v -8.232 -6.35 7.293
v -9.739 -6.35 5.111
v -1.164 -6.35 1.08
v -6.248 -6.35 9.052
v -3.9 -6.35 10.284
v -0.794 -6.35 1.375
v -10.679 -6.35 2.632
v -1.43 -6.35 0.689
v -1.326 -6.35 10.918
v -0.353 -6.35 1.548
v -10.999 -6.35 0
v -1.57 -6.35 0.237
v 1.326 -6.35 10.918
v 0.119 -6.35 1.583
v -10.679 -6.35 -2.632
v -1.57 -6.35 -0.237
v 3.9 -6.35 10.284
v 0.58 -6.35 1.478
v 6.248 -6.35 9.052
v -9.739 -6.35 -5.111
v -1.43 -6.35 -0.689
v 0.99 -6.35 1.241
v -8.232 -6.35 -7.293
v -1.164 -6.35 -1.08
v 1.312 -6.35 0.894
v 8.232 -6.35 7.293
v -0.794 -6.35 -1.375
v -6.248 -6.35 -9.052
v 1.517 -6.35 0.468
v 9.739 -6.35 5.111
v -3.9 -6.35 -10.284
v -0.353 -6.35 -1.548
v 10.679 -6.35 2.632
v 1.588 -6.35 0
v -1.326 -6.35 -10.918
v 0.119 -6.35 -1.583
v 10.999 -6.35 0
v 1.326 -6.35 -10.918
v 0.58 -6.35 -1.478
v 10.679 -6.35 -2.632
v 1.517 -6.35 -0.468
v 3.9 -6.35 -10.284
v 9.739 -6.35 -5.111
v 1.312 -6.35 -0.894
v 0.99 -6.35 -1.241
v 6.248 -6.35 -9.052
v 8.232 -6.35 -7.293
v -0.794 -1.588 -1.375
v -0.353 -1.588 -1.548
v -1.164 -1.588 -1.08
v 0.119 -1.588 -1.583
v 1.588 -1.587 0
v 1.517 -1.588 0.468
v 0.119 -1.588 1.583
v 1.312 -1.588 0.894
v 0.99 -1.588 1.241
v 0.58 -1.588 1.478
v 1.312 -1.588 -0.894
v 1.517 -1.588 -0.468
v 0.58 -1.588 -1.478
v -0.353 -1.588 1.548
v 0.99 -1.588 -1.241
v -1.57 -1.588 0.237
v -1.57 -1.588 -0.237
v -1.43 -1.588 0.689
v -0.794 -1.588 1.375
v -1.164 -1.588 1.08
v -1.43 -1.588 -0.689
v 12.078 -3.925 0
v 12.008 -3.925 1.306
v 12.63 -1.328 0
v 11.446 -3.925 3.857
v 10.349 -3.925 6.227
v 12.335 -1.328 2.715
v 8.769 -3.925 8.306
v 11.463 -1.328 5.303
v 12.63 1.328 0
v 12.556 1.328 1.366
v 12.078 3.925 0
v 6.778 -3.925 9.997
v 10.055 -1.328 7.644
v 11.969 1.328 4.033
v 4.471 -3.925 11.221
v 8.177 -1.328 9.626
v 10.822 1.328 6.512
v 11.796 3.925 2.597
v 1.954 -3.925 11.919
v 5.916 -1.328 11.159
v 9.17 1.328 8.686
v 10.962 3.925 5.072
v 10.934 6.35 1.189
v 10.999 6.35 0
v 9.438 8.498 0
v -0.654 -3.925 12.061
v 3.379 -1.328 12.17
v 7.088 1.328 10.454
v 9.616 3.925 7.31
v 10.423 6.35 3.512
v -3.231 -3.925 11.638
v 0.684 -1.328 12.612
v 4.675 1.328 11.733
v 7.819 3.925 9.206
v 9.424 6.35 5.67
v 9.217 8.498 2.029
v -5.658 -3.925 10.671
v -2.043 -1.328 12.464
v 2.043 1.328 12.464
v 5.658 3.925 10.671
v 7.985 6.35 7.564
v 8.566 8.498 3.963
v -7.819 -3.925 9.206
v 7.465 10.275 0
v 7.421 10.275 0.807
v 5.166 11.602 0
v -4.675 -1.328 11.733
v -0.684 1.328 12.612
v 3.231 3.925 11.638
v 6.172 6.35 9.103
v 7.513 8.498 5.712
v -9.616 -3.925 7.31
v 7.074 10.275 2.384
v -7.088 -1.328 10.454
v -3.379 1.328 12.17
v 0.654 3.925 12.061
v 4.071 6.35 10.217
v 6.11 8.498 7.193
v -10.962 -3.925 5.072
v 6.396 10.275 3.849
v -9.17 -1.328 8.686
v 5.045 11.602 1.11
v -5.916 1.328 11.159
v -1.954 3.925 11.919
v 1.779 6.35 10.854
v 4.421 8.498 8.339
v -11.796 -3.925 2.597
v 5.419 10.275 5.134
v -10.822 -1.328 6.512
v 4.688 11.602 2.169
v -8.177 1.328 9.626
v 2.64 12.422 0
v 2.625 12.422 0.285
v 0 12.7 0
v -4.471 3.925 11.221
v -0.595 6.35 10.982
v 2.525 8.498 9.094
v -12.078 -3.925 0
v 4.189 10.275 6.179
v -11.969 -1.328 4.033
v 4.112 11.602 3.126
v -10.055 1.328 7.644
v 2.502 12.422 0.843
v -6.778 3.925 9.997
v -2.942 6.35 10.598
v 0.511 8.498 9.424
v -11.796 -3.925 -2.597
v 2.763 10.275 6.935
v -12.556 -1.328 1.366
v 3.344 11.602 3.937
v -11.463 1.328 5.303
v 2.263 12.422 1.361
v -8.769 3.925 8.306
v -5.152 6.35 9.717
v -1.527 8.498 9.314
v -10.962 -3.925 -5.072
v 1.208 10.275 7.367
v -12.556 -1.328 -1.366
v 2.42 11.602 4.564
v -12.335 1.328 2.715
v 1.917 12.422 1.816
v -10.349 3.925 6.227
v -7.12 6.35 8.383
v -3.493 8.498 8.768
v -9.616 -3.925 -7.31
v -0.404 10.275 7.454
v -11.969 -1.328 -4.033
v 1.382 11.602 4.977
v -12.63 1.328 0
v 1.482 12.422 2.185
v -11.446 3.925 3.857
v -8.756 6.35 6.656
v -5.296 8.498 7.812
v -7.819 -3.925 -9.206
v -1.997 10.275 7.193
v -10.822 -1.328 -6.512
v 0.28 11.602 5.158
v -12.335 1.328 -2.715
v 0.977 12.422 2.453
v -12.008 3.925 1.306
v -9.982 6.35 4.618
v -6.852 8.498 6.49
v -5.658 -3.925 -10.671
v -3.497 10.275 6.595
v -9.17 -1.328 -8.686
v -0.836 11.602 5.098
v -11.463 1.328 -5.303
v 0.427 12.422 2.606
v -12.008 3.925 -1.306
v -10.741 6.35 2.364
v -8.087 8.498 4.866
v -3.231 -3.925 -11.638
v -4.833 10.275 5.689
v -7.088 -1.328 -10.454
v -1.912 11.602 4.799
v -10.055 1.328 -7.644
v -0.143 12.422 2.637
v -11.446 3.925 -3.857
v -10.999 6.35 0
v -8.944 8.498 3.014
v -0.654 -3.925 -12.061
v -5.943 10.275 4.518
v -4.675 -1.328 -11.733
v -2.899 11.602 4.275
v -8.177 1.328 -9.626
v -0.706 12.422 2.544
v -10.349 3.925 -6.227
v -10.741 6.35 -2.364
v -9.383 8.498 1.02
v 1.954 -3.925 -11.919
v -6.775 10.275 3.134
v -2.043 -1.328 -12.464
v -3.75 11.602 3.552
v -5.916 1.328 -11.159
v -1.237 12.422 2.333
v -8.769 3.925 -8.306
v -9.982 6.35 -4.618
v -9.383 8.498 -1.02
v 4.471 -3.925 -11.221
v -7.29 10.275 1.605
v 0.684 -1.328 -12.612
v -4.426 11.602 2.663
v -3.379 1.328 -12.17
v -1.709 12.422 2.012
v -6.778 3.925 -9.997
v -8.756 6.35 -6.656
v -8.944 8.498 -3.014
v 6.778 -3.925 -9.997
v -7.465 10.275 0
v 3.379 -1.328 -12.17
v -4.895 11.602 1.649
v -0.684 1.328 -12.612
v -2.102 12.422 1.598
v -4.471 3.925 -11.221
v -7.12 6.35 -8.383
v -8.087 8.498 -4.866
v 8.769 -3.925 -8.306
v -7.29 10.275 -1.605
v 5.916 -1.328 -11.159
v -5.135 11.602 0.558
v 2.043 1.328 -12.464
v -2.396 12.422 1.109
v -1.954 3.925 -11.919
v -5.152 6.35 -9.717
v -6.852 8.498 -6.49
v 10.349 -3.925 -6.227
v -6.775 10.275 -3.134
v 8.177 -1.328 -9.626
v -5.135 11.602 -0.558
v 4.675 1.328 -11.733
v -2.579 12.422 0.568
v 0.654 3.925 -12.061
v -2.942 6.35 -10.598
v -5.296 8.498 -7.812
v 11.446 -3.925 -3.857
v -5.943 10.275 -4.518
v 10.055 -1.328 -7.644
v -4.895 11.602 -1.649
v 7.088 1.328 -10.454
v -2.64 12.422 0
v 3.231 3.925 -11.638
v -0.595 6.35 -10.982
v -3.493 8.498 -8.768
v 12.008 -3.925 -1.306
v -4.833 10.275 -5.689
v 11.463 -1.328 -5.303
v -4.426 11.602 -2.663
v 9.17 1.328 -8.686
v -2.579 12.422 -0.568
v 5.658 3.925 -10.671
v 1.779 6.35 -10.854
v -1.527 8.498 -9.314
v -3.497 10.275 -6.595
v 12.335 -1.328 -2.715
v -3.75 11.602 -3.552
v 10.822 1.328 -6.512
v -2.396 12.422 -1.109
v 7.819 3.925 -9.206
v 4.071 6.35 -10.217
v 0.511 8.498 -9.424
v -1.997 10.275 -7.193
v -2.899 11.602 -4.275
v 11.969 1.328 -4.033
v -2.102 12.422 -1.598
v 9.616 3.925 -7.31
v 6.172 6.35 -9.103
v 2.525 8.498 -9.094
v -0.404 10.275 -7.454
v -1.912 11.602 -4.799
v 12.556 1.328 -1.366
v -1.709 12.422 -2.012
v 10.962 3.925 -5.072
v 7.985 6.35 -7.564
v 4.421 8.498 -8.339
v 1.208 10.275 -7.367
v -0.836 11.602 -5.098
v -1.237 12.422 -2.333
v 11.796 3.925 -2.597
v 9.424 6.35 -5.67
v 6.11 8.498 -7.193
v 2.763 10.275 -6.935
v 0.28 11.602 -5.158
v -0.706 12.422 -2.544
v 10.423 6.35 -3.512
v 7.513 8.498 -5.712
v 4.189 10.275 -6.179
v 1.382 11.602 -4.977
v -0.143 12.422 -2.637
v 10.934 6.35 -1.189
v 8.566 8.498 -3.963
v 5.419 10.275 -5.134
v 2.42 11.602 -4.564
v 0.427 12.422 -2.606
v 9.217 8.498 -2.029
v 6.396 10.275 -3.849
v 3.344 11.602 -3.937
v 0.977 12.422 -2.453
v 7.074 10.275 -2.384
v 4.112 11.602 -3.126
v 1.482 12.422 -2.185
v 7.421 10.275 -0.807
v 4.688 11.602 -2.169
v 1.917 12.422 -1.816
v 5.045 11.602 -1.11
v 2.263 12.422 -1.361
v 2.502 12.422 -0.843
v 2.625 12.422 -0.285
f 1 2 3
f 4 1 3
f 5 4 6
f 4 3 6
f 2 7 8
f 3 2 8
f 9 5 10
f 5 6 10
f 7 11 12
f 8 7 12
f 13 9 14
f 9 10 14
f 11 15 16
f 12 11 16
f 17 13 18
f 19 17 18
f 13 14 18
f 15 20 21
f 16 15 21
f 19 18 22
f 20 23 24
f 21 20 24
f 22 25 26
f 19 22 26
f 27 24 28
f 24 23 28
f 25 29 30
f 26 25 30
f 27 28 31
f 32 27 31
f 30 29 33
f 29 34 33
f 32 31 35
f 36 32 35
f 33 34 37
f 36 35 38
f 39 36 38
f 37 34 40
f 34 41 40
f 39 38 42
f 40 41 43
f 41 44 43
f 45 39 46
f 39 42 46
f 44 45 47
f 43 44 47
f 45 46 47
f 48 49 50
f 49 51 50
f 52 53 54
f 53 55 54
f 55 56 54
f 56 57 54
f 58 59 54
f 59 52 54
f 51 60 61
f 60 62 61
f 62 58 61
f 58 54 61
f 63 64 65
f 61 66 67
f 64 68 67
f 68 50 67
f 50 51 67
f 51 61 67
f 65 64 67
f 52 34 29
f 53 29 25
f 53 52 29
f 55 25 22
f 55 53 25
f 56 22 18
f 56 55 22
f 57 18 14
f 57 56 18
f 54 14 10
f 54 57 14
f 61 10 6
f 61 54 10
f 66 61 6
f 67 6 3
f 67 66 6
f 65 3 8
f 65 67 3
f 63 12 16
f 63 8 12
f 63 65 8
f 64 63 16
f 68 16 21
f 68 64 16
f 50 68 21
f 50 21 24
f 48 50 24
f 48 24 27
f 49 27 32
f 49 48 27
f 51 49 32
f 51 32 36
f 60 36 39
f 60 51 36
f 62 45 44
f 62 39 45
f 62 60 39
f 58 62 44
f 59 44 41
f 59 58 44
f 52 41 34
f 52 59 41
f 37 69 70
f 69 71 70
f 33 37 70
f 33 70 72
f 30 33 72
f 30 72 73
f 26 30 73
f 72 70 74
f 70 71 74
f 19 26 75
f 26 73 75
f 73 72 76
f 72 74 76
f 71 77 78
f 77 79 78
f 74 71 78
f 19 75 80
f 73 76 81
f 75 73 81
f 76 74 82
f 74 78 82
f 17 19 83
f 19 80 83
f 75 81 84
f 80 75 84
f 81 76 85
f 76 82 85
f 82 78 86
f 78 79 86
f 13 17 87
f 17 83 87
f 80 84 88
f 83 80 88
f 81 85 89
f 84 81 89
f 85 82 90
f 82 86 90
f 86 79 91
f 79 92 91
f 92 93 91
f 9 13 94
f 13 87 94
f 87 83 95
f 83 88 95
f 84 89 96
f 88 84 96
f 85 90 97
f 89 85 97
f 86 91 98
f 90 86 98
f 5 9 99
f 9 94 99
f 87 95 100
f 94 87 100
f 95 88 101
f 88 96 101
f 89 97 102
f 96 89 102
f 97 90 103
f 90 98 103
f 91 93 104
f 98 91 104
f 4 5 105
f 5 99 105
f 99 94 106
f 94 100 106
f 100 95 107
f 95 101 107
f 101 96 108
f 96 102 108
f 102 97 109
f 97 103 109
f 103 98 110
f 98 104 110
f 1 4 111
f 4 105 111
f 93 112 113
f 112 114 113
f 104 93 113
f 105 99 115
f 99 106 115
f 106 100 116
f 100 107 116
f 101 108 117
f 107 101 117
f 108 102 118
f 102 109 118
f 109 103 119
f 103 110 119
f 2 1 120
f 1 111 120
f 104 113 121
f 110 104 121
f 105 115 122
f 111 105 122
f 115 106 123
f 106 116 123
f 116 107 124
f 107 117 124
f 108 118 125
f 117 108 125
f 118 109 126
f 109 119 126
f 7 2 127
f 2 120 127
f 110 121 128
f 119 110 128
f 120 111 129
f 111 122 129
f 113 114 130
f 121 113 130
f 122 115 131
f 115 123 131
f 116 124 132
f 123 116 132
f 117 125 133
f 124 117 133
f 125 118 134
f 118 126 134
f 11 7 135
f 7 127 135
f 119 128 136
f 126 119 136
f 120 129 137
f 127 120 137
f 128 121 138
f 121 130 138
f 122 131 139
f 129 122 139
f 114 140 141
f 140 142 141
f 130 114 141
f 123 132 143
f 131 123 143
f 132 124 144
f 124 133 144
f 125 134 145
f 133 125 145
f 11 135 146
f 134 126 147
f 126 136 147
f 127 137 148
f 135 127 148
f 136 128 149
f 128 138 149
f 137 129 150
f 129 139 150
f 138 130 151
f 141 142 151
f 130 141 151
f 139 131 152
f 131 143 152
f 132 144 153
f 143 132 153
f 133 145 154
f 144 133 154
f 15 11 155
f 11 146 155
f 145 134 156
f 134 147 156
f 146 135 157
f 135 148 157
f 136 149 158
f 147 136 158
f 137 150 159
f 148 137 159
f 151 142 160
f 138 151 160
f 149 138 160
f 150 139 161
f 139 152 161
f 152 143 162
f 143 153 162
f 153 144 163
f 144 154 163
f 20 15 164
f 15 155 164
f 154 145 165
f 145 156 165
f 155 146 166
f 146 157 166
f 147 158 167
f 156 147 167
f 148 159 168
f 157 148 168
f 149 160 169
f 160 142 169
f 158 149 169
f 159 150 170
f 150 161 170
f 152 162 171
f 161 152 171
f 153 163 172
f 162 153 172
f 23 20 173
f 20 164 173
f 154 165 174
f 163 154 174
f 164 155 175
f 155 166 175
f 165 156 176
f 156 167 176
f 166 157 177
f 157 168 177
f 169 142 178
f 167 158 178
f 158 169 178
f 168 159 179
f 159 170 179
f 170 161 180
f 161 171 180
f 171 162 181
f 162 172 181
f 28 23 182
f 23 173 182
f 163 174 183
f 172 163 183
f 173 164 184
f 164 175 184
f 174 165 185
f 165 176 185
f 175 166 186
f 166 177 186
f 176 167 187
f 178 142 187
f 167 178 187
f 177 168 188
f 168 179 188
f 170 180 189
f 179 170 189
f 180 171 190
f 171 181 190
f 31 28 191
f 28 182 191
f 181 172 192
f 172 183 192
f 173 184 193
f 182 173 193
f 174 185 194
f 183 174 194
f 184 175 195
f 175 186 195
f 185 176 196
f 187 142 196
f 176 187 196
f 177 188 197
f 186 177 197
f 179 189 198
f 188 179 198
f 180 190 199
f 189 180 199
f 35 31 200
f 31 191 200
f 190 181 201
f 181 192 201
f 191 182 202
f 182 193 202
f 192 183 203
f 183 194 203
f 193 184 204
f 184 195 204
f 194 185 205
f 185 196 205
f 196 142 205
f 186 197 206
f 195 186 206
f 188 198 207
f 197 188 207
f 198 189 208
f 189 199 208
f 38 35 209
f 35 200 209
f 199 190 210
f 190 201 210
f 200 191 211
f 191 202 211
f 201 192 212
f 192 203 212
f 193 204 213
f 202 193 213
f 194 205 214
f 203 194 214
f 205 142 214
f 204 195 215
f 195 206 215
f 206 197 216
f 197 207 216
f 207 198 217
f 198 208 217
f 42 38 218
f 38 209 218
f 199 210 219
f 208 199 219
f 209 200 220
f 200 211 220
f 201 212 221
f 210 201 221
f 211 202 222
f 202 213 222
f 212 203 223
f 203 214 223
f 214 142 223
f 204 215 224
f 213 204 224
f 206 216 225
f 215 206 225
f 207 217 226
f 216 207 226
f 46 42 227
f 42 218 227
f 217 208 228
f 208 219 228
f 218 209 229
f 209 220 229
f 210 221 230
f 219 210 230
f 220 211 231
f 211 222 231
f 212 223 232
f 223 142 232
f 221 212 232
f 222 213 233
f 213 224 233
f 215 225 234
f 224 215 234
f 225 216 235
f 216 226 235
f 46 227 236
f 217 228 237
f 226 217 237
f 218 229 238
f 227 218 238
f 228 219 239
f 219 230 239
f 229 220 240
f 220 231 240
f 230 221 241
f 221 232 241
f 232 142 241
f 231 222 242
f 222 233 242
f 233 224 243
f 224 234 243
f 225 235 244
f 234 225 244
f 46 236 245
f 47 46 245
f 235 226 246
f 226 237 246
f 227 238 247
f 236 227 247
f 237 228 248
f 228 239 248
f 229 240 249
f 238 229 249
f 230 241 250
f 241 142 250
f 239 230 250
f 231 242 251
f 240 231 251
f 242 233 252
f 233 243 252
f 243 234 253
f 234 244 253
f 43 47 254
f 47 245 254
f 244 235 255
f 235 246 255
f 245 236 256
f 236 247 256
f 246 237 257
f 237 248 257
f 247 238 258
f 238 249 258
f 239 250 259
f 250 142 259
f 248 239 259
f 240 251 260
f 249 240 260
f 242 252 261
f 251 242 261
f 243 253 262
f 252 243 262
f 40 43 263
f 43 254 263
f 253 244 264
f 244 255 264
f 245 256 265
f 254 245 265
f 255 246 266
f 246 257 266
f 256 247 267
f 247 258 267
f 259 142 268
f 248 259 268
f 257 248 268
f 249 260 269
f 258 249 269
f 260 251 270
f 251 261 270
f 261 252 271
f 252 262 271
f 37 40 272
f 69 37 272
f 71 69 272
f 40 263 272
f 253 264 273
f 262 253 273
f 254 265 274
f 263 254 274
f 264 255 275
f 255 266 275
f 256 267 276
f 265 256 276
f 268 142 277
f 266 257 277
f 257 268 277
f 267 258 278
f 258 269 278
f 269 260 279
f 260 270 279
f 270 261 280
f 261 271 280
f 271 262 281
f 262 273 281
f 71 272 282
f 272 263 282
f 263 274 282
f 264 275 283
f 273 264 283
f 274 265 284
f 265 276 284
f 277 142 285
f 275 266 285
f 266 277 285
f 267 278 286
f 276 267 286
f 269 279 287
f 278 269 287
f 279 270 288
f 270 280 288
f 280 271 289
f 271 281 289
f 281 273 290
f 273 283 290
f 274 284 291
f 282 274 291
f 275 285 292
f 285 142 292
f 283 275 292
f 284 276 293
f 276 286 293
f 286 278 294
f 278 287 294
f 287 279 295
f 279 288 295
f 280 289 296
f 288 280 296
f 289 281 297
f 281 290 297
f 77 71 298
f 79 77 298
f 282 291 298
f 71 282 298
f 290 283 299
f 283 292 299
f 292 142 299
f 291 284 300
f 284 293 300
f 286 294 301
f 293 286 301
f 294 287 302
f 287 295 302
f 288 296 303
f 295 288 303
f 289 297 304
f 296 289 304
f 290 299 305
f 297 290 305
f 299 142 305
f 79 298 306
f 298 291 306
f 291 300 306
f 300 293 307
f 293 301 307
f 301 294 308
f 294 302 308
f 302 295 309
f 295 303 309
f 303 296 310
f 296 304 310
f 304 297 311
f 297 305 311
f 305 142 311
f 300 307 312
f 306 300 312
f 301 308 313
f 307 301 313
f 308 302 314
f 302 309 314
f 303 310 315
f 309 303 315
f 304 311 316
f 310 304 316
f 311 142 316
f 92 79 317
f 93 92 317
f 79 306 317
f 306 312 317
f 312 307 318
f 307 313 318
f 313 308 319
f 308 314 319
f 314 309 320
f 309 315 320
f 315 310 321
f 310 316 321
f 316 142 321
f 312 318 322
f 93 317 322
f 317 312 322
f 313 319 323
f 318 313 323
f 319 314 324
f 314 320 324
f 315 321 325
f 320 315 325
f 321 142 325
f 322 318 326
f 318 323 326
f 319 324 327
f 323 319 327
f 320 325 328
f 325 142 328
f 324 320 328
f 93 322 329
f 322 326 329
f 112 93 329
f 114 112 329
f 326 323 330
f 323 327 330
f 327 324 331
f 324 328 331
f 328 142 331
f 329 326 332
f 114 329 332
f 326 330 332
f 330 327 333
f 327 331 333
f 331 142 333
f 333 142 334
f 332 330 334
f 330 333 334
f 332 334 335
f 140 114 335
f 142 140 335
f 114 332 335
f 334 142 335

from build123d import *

# Parameters (mm, degrees)
TRUNCATED_BALL_DEPTH      = 13.7
TRUNCATED_BALL_DEPTH_BACK = 13.7
SKETCH8_W                 = 1.5875
SKETCH8_H                 = 11.1125


with BuildPart() as part:
    # Sketch1 → Complete_Ball (revolve)
    with BuildSketch(Plane.XY):
        with BuildLine():
            Line((0, 12.7), (0, -12.7))
            ThreePointArc((0, -12.7), (12.7, 0), (0, 12.7))
        make_face()
    revolve(axis=Axis((0, 13.6525, 0), (0, -1, 0)))

    # Sketch2 → Truncated_ball (cut, two sides)
    with BuildSketch(Plane.XY) as truncated_ball_sk:
        with BuildLine():
            Line((-10.998522628, -6.35), (10.998522628, -6.35))
            ThreePointArc((10.998522628, -6.35), (0, -12.7), (-10.998522628, -6.35))
        make_face()
    extrude(amount=TRUNCATED_BALL_DEPTH, mode=Mode.SUBTRACT)
    extrude(truncated_ball_sk.sketch, amount=-TRUNCATED_BALL_DEPTH_BACK, mode=Mode.SUBTRACT)

    # Sketch8 → Truncated_ball_w_blind_hole (revolve, cut)
    with BuildSketch(Plane.XY):
        with Locations((0.79375, -7.14375)):
            Rectangle(SKETCH8_W, SKETCH8_H)
    revolve(axis=Axis((0, 6.726898043, 0), (0, -1, 0)), mode=Mode.SUBTRACT)


solid = part.part
